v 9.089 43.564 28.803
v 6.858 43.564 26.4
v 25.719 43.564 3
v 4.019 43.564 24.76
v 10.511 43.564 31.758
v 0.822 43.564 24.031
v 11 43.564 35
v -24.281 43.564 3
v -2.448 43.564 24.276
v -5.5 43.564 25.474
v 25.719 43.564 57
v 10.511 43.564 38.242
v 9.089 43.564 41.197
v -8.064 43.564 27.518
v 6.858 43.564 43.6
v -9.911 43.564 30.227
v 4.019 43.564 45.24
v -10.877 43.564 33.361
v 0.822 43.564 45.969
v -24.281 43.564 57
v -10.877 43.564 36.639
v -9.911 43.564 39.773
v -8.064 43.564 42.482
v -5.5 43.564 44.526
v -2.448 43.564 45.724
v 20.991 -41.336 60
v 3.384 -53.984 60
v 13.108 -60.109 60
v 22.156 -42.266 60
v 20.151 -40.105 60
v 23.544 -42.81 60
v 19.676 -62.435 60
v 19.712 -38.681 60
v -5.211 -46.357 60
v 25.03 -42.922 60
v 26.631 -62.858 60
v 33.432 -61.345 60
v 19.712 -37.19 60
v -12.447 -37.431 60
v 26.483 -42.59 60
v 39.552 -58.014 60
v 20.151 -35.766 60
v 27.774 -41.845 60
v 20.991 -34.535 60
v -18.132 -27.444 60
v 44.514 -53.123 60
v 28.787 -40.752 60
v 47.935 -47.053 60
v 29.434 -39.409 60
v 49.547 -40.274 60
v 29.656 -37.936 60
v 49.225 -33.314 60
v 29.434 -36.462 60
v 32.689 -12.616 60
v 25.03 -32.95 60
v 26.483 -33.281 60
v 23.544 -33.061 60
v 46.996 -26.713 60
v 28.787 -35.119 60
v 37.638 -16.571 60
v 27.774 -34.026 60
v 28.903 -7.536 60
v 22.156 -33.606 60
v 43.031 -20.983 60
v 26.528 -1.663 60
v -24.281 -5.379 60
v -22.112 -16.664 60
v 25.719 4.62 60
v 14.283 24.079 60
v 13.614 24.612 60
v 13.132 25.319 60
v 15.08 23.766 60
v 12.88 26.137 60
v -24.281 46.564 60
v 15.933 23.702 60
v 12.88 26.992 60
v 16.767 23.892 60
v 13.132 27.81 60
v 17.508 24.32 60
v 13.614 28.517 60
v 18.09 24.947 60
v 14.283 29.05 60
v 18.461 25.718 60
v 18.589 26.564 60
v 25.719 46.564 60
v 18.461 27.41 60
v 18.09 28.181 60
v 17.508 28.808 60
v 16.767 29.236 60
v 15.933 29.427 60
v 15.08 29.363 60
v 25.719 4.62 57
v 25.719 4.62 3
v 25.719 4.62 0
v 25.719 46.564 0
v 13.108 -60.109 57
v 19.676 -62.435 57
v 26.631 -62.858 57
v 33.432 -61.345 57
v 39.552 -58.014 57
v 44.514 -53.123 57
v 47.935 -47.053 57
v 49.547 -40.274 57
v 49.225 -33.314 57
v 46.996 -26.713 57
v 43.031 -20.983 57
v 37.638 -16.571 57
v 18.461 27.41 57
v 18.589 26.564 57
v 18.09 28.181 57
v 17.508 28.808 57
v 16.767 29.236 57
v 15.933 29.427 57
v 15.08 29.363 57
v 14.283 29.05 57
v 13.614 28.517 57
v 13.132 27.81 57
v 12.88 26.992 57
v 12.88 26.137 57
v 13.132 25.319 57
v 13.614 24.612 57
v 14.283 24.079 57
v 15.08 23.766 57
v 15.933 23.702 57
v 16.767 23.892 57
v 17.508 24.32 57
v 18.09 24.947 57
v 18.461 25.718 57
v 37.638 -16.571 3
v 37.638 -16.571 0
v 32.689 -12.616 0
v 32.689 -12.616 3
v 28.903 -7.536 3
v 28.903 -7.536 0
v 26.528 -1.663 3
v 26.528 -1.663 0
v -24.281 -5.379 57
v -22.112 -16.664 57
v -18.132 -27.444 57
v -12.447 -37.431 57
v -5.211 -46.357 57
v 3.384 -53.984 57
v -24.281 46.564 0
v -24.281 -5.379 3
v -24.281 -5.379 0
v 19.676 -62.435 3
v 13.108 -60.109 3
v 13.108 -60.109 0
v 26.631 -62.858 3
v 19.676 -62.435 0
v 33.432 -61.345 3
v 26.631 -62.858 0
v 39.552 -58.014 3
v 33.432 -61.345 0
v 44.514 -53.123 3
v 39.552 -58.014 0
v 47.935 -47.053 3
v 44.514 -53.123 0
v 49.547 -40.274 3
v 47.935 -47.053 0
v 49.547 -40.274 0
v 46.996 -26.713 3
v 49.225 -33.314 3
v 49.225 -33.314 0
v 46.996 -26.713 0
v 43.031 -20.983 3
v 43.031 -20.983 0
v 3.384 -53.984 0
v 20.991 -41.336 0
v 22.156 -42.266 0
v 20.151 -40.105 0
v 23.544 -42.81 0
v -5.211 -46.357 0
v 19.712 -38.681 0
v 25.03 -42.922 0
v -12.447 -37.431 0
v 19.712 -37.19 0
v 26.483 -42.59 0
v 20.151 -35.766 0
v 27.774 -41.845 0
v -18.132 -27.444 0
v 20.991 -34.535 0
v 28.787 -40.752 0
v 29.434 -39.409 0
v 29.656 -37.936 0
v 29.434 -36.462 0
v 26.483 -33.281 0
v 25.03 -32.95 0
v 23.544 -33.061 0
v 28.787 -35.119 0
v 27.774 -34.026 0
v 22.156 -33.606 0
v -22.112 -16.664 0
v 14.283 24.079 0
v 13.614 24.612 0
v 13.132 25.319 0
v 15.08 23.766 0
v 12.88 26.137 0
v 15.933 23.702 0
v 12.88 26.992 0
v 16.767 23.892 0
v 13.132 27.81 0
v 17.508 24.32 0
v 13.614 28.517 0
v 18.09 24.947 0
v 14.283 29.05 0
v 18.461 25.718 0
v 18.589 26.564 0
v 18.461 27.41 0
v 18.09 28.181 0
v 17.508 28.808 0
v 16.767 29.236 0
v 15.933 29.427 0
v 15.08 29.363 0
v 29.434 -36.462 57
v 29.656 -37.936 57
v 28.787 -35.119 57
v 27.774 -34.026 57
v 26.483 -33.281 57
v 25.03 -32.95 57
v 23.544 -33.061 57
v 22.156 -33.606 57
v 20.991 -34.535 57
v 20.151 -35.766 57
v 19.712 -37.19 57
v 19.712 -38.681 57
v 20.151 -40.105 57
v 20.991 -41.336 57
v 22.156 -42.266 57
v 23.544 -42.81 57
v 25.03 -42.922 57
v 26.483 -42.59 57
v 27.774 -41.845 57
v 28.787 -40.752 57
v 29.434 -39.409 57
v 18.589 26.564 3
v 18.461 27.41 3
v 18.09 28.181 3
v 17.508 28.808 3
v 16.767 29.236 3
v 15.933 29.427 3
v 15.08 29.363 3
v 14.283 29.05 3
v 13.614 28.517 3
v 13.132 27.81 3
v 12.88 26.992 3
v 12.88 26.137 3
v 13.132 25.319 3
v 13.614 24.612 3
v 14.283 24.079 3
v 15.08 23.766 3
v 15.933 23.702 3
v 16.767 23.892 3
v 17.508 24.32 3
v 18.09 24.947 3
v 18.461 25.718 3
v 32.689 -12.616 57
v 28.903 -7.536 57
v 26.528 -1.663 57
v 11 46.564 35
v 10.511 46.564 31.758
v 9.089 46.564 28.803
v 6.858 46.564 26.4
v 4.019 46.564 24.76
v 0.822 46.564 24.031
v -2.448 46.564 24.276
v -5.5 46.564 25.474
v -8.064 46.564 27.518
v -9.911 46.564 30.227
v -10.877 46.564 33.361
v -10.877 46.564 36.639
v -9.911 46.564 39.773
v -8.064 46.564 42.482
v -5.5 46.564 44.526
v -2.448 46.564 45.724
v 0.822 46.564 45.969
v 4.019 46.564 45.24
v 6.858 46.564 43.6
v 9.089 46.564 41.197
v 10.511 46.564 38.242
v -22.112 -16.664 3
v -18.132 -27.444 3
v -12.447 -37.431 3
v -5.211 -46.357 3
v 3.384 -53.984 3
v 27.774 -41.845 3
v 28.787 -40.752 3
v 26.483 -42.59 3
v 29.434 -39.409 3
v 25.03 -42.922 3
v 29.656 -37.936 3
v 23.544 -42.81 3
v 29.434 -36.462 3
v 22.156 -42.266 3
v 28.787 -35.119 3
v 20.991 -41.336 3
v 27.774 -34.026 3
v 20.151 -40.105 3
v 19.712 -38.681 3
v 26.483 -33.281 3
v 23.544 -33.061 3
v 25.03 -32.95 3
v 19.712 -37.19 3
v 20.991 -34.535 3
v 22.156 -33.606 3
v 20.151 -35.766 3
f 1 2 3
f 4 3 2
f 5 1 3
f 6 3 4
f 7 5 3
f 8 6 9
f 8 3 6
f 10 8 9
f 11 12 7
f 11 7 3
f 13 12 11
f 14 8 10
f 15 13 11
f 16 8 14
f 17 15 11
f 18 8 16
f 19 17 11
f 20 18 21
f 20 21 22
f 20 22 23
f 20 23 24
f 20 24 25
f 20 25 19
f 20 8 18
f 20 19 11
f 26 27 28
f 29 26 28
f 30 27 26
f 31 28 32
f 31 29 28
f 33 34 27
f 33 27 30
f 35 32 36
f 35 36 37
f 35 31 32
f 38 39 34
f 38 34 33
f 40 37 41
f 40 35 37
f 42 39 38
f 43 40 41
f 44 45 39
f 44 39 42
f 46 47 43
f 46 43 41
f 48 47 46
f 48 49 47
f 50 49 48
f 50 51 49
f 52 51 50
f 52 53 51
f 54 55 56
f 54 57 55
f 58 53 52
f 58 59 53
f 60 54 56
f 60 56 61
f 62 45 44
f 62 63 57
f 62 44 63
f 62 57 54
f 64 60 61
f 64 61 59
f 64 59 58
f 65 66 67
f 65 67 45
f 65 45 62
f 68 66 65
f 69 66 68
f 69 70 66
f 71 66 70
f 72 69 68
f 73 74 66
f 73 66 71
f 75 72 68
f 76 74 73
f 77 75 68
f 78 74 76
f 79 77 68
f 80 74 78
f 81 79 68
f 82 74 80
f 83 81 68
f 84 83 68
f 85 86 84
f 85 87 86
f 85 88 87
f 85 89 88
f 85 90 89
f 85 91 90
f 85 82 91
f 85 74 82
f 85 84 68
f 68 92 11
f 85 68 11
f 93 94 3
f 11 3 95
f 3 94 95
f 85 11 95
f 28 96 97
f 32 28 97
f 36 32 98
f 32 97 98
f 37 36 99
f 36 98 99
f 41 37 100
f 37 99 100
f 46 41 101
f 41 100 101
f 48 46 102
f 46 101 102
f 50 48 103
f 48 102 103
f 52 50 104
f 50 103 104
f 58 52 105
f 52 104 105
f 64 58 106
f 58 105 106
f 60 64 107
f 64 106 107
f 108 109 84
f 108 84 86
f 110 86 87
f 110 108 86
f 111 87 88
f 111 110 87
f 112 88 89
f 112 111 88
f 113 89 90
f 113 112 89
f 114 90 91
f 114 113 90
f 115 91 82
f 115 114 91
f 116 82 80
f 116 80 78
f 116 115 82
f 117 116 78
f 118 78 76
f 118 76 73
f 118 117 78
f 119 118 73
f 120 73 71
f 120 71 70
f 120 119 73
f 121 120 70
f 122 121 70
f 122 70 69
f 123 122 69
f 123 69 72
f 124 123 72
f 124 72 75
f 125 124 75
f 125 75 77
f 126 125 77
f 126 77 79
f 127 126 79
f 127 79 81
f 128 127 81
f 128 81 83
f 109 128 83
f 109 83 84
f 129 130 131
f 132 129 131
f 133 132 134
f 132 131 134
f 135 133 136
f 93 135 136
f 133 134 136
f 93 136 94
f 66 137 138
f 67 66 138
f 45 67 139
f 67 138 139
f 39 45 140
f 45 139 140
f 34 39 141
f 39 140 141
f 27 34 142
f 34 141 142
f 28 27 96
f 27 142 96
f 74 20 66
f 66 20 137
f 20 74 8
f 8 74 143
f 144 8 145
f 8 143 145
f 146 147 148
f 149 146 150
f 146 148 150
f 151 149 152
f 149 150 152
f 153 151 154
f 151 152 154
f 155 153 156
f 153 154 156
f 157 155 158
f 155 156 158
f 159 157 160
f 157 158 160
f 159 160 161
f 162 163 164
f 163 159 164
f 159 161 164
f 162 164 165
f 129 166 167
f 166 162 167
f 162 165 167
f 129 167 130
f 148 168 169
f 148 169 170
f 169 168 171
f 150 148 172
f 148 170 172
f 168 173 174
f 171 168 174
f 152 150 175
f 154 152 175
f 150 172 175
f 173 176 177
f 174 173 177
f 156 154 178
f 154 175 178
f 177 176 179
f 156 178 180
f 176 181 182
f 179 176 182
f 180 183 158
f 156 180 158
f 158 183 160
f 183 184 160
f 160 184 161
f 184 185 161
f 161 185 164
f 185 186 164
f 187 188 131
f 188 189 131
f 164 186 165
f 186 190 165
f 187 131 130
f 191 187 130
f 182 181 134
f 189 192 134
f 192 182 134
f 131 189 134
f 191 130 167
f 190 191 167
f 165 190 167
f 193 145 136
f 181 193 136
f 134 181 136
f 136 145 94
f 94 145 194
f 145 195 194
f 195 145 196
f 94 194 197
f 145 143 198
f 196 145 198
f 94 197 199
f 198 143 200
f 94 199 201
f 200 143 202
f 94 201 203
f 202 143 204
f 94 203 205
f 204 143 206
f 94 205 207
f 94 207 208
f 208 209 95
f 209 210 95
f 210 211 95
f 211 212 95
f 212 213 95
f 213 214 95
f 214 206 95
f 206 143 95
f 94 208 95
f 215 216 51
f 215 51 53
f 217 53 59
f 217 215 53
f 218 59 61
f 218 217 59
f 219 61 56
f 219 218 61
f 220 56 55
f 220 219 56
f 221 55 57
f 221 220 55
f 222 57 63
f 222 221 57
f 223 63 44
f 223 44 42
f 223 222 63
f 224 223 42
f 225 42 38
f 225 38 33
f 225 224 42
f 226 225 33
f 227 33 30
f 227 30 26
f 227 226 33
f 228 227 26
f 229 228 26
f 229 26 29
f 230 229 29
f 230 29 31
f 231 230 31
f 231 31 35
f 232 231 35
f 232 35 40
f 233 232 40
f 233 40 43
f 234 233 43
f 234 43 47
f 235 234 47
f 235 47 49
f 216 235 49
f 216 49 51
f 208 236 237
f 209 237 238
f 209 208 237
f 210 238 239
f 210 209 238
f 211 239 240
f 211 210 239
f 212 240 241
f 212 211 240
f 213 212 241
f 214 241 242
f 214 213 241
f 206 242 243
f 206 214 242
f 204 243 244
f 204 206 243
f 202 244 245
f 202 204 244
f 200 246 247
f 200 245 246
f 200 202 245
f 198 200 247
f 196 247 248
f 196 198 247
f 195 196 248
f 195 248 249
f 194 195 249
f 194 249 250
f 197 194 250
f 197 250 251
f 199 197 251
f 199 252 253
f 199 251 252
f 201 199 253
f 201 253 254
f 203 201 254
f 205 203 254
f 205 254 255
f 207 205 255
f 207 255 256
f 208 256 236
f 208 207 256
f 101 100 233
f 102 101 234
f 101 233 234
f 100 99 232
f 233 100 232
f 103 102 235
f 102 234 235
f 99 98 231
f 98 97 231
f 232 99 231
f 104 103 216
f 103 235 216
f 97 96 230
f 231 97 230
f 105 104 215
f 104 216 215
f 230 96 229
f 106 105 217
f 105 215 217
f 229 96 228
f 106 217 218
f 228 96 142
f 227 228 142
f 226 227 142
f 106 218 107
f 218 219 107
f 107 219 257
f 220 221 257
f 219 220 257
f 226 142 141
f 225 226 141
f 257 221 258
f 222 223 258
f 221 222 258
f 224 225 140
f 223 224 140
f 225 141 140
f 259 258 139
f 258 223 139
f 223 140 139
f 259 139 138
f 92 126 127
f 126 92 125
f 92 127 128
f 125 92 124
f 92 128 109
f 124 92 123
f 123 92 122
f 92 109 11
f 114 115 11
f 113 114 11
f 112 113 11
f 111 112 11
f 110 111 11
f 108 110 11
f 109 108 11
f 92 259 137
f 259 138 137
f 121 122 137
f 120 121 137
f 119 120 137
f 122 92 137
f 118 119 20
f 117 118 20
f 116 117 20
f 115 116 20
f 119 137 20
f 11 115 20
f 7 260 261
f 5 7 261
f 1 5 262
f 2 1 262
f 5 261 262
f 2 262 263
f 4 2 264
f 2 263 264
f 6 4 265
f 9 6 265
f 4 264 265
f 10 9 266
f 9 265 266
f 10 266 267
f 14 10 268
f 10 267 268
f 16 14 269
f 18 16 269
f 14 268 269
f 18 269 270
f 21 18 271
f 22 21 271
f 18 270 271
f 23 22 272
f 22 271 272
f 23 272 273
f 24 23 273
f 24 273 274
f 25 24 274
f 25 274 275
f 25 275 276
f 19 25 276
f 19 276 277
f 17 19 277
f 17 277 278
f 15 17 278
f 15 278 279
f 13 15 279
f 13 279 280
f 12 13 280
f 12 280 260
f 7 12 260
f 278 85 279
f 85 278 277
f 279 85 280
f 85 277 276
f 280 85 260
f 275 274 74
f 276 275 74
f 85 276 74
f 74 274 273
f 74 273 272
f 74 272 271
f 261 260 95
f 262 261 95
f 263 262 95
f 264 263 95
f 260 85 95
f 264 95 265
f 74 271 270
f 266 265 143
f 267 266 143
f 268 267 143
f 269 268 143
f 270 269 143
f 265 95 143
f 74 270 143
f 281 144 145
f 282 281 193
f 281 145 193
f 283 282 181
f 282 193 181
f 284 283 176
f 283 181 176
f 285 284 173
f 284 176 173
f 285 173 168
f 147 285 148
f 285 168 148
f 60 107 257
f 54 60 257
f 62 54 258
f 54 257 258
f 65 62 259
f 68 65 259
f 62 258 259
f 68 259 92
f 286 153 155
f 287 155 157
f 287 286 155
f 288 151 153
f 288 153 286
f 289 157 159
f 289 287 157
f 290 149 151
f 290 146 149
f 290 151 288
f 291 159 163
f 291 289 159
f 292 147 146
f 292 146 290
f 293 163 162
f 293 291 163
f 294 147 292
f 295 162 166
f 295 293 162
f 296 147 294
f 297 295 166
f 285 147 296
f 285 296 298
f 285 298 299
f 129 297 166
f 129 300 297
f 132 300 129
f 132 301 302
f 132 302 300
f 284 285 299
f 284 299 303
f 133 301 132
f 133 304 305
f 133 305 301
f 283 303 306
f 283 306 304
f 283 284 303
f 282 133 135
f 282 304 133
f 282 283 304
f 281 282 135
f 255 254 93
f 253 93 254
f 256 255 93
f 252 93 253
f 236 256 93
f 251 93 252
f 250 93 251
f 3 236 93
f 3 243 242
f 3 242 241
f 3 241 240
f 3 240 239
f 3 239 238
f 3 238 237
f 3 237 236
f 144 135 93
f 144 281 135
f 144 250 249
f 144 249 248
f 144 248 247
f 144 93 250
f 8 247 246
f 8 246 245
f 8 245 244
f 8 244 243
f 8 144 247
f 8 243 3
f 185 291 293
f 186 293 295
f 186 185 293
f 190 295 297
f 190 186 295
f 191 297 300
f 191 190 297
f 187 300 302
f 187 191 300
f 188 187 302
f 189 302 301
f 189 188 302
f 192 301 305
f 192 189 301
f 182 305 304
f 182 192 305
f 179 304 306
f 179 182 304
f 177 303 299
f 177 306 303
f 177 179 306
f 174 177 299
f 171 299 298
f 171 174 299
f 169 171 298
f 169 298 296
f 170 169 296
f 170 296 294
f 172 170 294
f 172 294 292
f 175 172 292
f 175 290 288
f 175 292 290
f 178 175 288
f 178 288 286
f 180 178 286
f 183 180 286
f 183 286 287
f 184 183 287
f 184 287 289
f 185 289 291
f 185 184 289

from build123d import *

# Parameters (mm, degrees)
SKETCH_1_R          = 5
SKETCH_1_R_2        = 2.870333843
EXTRUDE_1_DEPTH     = 60
SKETCH_2_W          = 54
SKETCH_2_H          = 139.687150663
CUT_EXTRUDE_1_DEPTH = 74.937741711
SKETCH_3_R          = 11
CUT_EXTRUDE_2_DEPTH = 70


with BuildPart() as part:
    # 草图1 → 凸台-拉伸1 (new body)
    with BuildSketch(Plane.XY):
        with BuildLine():
            Line((-24.281457554, 46.564371273), (-24.281457554, -5.37876517))
            ThreePointArc((-24.281457554, -5.37876517), (-12.44727906, -37.430517799), (13.107980321, -60.108510328))
            ThreePointArc((13.107980321, -60.108510328), (46.43701917, -50.207530875), (37.638484361, -16.570646211))
            ThreePointArc((37.638484361, -16.570646211), (28.903009587, -7.536360283), (25.718542446, 4.620366695))
            Line((25.718542446, 4.620366695), (25.718542446, 46.564371273))
            Line((25.718542446, 46.564371273), (-24.281457554, 46.564371273))
        make_face()
        with Locations((24.656284158, -37.935628727)):
            Circle(SKETCH_1_R, mode=Mode.SUBTRACT)
        with Locations((15.718542446, 26.564371273)):
            Circle(SKETCH_1_R_2, mode=Mode.SUBTRACT)
    extrude(amount=EXTRUDE_1_DEPTH)

    # 草图2 → 切除-拉伸1 (cut, through all)
    with BuildSketch(Plane.ZY.offset(24.281457554)):
        with Locations((30, -26.279204058)):
            Rectangle(SKETCH_2_W, SKETCH_2_H)
    extrude(amount=-CUT_EXTRUDE_1_DEPTH, mode=Mode.SUBTRACT)

    # 草图3 → 切除-拉伸2 (cut)
    with BuildSketch(Plane(origin=(0, 46.564371273, 0), x_dir=(1, 0, 0), z_dir=(0, 1, 0))):
        with Locations((0, -35)):
            Circle(SKETCH_3_R)
    extrude(amount=-CUT_EXTRUDE_2_DEPTH, mode=Mode.SUBTRACT)


solid = part.part
